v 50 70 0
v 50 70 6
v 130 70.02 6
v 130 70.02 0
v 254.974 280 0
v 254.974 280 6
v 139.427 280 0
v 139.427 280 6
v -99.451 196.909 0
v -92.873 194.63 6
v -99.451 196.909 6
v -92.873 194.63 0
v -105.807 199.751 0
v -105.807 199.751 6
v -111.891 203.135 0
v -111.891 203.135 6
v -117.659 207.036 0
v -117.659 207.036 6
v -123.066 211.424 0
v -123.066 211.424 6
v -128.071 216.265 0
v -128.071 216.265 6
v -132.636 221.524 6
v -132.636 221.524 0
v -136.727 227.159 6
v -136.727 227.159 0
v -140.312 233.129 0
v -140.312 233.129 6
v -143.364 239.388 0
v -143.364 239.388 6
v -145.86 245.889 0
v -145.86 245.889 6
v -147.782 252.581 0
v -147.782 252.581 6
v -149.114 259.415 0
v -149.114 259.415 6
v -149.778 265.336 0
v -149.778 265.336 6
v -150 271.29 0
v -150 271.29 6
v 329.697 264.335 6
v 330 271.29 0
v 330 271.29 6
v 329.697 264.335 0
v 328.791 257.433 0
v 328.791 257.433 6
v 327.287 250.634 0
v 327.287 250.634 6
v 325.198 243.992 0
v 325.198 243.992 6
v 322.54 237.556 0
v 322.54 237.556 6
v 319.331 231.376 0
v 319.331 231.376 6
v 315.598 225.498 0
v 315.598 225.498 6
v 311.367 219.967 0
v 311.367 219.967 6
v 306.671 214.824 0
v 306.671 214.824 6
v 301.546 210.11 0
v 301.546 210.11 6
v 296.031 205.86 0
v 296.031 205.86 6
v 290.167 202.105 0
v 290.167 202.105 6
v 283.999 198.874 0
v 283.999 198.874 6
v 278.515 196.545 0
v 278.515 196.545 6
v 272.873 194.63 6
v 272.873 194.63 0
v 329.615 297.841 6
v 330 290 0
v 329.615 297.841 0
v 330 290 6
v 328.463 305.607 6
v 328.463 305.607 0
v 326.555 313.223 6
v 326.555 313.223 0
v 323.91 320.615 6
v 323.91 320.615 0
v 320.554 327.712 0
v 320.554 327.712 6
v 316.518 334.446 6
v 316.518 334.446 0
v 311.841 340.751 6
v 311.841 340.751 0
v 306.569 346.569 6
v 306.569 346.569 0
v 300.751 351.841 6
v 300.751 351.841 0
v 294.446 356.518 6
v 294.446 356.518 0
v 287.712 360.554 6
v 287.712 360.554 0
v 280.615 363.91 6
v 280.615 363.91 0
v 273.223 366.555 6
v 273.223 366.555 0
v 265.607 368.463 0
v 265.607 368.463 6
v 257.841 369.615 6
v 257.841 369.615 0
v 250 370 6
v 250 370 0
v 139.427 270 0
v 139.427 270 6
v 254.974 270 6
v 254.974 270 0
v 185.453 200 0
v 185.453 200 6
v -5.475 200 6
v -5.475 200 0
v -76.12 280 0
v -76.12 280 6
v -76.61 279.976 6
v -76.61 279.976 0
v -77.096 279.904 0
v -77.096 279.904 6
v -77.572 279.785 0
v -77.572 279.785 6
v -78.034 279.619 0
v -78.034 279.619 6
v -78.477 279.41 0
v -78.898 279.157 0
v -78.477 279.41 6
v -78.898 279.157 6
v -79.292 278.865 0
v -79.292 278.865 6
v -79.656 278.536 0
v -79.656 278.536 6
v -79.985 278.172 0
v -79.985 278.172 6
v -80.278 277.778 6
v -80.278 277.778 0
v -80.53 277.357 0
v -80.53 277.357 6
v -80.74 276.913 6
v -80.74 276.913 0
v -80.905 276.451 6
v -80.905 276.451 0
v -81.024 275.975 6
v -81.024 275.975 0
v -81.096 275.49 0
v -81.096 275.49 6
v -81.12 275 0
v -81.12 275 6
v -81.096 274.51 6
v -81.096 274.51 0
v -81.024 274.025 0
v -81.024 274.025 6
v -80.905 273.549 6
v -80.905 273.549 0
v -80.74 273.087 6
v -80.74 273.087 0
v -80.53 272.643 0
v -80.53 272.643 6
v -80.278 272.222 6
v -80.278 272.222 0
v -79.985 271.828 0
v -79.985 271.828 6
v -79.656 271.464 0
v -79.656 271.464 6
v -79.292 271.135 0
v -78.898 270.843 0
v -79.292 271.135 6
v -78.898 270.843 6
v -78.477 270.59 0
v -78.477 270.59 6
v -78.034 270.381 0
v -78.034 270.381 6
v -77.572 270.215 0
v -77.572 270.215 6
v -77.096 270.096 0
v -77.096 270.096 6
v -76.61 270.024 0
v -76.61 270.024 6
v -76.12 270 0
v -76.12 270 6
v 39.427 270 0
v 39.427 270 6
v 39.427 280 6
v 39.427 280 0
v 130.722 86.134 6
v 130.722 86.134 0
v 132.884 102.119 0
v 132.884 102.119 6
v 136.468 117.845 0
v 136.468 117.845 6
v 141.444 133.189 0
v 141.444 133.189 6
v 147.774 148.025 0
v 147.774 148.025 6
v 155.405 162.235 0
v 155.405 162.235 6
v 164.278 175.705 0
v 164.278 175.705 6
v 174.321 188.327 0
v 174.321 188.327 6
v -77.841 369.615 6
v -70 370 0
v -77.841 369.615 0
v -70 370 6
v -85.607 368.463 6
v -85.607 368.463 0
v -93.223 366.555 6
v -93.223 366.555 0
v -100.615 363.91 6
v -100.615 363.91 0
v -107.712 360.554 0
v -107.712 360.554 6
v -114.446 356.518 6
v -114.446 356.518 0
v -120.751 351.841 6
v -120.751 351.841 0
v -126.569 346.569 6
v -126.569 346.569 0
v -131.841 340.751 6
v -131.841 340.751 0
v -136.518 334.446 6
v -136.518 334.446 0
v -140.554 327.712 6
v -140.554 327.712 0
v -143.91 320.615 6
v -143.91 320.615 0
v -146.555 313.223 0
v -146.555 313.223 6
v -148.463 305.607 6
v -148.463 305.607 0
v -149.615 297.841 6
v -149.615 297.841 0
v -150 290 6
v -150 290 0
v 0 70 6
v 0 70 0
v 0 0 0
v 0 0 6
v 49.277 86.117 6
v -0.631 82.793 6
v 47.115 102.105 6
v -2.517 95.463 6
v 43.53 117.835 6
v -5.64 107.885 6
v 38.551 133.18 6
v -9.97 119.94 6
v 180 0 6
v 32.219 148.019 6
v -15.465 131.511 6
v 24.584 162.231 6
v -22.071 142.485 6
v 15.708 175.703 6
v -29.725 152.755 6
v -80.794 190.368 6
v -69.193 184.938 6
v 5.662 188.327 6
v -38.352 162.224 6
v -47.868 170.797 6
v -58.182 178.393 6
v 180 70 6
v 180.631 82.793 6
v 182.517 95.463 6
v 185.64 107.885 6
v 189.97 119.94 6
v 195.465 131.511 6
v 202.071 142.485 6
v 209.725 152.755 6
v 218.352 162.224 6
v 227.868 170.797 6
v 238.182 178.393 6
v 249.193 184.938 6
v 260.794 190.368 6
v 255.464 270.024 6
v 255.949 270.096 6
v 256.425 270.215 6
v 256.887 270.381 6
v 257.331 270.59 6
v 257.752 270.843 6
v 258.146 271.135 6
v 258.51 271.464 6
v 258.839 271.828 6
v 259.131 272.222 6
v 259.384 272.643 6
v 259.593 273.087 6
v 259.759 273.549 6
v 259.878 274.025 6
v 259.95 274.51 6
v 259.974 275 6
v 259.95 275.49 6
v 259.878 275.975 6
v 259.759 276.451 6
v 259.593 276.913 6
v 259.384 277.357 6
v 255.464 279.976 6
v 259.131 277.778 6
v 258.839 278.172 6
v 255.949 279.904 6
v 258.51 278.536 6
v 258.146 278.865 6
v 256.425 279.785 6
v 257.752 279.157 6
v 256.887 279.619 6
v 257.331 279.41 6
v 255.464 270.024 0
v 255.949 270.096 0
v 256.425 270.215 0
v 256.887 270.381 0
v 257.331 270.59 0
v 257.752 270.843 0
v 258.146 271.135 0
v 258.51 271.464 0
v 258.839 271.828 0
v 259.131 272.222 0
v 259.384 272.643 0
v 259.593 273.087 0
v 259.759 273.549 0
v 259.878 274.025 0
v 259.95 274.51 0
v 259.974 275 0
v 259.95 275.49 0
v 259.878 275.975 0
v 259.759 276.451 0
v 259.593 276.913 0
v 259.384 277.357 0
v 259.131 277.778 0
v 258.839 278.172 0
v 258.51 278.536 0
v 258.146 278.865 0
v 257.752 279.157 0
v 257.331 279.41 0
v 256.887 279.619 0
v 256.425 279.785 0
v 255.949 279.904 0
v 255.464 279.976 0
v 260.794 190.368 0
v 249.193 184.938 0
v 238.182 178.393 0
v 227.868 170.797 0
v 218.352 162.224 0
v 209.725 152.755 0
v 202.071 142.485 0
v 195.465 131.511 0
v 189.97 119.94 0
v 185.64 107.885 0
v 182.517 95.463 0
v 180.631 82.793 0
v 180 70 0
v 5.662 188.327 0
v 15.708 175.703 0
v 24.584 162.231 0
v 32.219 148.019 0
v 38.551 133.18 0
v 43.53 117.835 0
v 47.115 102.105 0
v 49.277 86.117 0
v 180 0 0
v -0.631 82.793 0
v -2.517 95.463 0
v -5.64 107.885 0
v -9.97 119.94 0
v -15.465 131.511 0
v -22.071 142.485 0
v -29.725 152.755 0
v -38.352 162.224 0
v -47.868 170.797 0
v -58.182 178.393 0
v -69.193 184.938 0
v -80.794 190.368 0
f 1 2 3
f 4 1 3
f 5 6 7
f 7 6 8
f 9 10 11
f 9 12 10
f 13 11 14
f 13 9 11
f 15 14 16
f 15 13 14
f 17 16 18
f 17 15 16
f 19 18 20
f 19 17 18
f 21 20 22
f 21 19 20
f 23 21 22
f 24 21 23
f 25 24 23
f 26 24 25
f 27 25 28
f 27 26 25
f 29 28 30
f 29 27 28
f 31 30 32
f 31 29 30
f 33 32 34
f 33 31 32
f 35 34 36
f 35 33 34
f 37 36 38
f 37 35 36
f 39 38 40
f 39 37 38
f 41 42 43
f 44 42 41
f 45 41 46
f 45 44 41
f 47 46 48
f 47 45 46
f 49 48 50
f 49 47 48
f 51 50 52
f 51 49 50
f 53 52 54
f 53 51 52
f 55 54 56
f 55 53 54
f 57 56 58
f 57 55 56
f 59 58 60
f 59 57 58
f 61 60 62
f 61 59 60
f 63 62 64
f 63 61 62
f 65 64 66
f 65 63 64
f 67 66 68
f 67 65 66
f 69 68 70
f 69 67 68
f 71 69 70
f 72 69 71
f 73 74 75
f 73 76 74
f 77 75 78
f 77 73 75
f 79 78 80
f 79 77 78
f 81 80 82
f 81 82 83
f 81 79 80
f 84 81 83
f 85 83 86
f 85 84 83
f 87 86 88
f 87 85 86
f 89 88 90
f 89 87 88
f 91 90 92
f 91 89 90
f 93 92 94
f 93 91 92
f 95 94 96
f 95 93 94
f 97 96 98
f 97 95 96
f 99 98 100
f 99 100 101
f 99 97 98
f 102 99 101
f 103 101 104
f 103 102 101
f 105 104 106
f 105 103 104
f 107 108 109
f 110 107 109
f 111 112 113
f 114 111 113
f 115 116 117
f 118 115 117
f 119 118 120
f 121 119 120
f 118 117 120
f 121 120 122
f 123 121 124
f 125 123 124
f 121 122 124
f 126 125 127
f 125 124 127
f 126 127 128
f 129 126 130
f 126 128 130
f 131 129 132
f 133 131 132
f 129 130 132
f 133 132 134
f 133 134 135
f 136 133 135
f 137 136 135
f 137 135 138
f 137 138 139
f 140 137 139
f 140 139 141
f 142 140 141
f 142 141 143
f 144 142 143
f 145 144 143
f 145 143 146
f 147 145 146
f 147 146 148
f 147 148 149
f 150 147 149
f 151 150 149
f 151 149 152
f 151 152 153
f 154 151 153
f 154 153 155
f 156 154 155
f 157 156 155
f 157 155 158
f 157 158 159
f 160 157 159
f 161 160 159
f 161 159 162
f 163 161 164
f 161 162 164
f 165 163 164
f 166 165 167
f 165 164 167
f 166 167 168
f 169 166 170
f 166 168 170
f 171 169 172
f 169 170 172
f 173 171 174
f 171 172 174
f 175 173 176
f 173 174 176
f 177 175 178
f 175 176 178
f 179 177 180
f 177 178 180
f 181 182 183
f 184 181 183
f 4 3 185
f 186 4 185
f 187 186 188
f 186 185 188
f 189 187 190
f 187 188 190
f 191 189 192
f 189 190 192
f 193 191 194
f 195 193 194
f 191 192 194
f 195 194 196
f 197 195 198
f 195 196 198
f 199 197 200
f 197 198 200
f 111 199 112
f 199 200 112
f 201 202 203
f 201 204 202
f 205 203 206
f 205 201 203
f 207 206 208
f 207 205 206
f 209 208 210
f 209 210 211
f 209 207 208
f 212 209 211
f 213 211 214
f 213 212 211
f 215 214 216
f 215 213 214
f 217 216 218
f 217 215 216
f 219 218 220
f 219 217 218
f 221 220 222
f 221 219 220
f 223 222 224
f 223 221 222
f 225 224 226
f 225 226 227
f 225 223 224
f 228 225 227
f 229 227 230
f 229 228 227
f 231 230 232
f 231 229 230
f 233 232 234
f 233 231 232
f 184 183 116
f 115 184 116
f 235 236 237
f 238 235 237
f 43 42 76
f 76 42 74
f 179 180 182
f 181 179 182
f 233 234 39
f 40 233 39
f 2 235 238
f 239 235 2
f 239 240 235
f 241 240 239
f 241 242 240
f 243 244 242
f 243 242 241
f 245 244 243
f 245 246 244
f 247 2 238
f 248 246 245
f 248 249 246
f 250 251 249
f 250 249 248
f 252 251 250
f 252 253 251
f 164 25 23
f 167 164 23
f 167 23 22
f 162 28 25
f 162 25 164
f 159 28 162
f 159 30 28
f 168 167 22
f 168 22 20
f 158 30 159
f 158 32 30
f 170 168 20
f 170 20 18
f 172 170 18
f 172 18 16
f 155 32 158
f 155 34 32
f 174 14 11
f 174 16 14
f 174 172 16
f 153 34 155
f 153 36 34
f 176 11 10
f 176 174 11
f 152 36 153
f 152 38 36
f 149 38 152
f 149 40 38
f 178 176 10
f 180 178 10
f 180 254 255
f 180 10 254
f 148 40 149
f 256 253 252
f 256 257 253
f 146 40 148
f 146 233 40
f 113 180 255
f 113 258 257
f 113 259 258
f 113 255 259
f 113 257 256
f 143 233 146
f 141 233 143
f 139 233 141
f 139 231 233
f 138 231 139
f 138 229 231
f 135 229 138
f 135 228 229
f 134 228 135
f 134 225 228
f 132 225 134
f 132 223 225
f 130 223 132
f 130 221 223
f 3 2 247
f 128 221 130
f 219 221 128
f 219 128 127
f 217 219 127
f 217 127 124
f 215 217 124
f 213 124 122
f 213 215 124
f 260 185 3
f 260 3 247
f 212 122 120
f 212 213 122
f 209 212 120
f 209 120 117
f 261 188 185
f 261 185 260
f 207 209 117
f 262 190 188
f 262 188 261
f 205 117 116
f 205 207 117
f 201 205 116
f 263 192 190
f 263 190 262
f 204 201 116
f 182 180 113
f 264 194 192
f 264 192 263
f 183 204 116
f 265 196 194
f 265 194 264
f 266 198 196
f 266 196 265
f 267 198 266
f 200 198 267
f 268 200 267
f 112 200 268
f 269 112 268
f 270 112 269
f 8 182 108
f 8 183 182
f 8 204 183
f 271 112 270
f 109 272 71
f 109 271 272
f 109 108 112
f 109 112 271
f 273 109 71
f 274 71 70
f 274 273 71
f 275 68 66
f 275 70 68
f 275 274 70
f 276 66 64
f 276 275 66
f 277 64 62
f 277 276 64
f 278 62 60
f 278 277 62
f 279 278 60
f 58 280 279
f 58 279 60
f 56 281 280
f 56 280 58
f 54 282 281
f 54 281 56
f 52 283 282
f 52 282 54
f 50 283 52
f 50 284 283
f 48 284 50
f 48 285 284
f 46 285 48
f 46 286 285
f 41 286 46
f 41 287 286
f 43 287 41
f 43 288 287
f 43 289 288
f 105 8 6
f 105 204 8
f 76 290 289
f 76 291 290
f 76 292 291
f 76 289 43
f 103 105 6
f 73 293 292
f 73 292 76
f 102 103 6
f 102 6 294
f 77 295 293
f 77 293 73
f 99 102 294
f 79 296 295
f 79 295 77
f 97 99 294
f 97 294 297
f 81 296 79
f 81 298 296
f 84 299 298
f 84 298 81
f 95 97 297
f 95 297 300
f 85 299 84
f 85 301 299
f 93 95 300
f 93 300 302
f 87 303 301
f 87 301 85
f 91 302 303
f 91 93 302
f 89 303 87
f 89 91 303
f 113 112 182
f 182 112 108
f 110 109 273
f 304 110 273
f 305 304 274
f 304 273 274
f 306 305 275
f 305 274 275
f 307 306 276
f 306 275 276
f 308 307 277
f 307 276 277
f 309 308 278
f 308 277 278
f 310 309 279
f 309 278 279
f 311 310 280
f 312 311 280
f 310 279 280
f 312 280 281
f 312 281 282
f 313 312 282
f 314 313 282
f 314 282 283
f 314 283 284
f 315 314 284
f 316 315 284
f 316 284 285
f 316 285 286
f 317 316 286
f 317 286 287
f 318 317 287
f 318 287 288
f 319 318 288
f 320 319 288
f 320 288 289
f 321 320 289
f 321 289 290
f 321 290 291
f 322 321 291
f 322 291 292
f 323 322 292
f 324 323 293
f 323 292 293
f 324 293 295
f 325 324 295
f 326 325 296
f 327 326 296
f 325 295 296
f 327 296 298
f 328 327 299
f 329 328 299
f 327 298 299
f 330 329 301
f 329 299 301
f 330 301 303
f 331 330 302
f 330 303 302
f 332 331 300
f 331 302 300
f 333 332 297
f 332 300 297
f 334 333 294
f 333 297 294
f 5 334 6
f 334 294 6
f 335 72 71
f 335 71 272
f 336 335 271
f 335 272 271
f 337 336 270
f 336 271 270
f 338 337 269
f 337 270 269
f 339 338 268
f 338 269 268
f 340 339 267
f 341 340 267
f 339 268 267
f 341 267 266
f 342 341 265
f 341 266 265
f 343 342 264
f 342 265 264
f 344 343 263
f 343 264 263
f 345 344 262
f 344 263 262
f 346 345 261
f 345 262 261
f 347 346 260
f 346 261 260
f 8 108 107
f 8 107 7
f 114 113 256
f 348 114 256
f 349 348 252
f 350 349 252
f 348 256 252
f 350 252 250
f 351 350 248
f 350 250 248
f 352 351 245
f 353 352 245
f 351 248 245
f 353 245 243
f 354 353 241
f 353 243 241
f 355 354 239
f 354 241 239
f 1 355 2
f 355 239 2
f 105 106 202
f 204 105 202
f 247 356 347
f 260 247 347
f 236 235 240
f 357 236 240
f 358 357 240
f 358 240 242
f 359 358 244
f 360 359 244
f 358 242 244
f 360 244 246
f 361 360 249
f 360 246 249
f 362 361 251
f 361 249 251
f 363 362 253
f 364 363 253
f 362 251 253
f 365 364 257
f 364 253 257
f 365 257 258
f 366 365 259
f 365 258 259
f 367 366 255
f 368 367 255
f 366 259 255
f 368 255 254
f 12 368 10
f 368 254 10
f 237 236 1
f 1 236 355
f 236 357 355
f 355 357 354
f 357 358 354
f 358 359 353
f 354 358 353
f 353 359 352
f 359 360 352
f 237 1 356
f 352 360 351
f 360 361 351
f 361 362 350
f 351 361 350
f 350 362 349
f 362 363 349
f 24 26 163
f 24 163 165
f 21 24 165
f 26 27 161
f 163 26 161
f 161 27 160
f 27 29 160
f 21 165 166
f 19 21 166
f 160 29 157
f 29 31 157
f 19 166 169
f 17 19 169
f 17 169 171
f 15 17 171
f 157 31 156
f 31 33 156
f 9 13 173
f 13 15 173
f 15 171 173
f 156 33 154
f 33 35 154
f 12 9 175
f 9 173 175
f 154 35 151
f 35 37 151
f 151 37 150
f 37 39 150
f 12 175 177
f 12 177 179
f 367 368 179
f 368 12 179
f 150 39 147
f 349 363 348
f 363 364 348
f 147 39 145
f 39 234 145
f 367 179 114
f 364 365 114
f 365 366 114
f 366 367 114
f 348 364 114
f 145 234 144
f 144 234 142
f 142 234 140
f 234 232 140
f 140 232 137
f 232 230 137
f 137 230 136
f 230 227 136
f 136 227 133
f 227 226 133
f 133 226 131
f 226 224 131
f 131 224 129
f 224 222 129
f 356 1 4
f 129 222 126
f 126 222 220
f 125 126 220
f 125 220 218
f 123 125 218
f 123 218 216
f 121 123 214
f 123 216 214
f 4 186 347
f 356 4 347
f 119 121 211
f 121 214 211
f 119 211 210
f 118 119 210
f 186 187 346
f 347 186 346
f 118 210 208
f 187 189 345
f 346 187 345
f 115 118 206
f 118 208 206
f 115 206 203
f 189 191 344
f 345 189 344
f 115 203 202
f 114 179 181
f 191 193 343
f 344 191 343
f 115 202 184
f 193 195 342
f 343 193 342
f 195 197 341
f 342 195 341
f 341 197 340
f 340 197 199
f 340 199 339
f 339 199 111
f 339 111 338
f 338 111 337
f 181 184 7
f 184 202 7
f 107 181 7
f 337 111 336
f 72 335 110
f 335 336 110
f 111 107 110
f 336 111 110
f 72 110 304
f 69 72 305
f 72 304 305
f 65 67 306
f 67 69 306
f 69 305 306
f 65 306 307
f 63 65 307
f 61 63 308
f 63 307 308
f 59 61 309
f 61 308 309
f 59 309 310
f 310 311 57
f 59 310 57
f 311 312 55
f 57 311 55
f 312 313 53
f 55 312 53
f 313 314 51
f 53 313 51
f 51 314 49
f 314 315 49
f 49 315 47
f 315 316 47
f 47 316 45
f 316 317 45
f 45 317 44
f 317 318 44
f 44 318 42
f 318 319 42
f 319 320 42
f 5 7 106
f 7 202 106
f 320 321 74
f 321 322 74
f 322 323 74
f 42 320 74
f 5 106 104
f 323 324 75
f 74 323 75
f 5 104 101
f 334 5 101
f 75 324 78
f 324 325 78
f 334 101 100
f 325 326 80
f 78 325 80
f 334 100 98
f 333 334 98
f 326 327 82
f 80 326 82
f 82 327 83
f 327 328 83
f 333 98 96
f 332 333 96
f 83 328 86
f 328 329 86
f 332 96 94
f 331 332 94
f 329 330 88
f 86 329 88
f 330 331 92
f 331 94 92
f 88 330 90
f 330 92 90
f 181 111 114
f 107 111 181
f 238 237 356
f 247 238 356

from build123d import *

# Parameters (mm, degrees)
RESSALTO_EXTRUS_O1_DEPTH = 6
FILETE1_R                = 80
CORTE_EXTRUS_O1_DEPTH    = 496.818515185
FILETE2_R                = 80
CORTE_EXTRUS_O2_DEPTH    = 496.818515327
CORTE_EXTRUS_O3_DEPTH    = 6
ESBO_O7_W                = 100
ESBO_O7_H                = 10
RESSALTO_EXTRUS_O4_DEPTH = 6


with BuildPart() as part:
    # Esboço1 → Ressalto-extrusão1 (new body)
    with BuildSketch(Plane.XY):
        Polygon((-150, 70), (0, 70), (0, 0), (180, 0), (180, 70), (330, 70), (330, 370), (-150, 370), align=None)
    extrude(amount=RESSALTO_EXTRUS_O1_DEPTH)

    # Filete1
    filete1_edges = [part.edges().sort_by_distance(p)[0] for p in [
        (-150, 370, 3),
        (330, 370, 3),
    ]]
    fillet(filete1_edges, radius=FILETE1_R)

    # Esboço4 → Corte-extrusão1 (cut, through all)
    with BuildSketch(Plane.XY.offset(6)):
        with BuildLine():
            Line((-150, 70), (0, 70))
            ThreePointArc((0, 70), (-36.716416622, 160.567770202), (-126.135181443, 200))
            Line((-126.135181443, 200), (-150, 200))
            Line((-150, 200), (-150, 70))
        make_face()
        with BuildLine():
            Line((330, 200), (306.135181443, 200))
            ThreePointArc((306.135181443, 200), (216.716416622, 160.567770202), (180, 70))
            Line((180, 70), (330, 70))
            Line((330, 70), (330, 200))
        make_face()
    extrude(amount=-CORTE_EXTRUS_O1_DEPTH, mode=Mode.SUBTRACT)

    # Filete2
    filete2_edges = [part.edges().sort_by_distance(p)[0] for p in [
        (330, 200, 3),
        (-150, 200, 3),
    ]]
    fillet(filete2_edges, radius=FILETE2_R)

    # Esboço5 → Corte-extrusão2 (cut, through all)
    with BuildSketch(Plane.XY.offset(6)):
        with BuildLine():
            Line((254.973969337, 280), (-76.120192614, 280))
            ThreePointArc((-76.120192614, 280), (-81.120192614, 275), (-76.120192614, 270))
            Line((-76.120192614, 270), (254.973969337, 270))
            ThreePointArc((254.973969337, 270), (259.973969337, 275), (254.973969337, 280))
        make_face()
    extrude(amount=-CORTE_EXTRUS_O2_DEPTH, mode=Mode.SUBTRACT)

    # Esboço6 → Corte-extrusão3 (cut)
    with BuildSketch(Plane.XY.offset(6)):
        with BuildLine():
            Line((50, 70), (130, 70.020316047))
            ThreePointArc((130, 70.020316047), (144.44257782, 140.677589128), (185.453428357, 200))
            Line((185.453428357, 200), (-5.474624038, 200))
            ThreePointArc((-5.474624038, 200), (35.551661067, 140.670775275), (50, 70))
        make_face()
    extrude(amount=-CORTE_EXTRUS_O3_DEPTH, mode=Mode.SUBTRACT)

    # Esboço7 → Ressalto-extrusão4 (add)
    with BuildSketch(Plane.XY.offset(6)):
        with Locations((89.426888362, 275)):
            Rectangle(ESBO_O7_W, ESBO_O7_H)
    extrude(amount=-RESSALTO_EXTRUS_O4_DEPTH)


solid = part.part
